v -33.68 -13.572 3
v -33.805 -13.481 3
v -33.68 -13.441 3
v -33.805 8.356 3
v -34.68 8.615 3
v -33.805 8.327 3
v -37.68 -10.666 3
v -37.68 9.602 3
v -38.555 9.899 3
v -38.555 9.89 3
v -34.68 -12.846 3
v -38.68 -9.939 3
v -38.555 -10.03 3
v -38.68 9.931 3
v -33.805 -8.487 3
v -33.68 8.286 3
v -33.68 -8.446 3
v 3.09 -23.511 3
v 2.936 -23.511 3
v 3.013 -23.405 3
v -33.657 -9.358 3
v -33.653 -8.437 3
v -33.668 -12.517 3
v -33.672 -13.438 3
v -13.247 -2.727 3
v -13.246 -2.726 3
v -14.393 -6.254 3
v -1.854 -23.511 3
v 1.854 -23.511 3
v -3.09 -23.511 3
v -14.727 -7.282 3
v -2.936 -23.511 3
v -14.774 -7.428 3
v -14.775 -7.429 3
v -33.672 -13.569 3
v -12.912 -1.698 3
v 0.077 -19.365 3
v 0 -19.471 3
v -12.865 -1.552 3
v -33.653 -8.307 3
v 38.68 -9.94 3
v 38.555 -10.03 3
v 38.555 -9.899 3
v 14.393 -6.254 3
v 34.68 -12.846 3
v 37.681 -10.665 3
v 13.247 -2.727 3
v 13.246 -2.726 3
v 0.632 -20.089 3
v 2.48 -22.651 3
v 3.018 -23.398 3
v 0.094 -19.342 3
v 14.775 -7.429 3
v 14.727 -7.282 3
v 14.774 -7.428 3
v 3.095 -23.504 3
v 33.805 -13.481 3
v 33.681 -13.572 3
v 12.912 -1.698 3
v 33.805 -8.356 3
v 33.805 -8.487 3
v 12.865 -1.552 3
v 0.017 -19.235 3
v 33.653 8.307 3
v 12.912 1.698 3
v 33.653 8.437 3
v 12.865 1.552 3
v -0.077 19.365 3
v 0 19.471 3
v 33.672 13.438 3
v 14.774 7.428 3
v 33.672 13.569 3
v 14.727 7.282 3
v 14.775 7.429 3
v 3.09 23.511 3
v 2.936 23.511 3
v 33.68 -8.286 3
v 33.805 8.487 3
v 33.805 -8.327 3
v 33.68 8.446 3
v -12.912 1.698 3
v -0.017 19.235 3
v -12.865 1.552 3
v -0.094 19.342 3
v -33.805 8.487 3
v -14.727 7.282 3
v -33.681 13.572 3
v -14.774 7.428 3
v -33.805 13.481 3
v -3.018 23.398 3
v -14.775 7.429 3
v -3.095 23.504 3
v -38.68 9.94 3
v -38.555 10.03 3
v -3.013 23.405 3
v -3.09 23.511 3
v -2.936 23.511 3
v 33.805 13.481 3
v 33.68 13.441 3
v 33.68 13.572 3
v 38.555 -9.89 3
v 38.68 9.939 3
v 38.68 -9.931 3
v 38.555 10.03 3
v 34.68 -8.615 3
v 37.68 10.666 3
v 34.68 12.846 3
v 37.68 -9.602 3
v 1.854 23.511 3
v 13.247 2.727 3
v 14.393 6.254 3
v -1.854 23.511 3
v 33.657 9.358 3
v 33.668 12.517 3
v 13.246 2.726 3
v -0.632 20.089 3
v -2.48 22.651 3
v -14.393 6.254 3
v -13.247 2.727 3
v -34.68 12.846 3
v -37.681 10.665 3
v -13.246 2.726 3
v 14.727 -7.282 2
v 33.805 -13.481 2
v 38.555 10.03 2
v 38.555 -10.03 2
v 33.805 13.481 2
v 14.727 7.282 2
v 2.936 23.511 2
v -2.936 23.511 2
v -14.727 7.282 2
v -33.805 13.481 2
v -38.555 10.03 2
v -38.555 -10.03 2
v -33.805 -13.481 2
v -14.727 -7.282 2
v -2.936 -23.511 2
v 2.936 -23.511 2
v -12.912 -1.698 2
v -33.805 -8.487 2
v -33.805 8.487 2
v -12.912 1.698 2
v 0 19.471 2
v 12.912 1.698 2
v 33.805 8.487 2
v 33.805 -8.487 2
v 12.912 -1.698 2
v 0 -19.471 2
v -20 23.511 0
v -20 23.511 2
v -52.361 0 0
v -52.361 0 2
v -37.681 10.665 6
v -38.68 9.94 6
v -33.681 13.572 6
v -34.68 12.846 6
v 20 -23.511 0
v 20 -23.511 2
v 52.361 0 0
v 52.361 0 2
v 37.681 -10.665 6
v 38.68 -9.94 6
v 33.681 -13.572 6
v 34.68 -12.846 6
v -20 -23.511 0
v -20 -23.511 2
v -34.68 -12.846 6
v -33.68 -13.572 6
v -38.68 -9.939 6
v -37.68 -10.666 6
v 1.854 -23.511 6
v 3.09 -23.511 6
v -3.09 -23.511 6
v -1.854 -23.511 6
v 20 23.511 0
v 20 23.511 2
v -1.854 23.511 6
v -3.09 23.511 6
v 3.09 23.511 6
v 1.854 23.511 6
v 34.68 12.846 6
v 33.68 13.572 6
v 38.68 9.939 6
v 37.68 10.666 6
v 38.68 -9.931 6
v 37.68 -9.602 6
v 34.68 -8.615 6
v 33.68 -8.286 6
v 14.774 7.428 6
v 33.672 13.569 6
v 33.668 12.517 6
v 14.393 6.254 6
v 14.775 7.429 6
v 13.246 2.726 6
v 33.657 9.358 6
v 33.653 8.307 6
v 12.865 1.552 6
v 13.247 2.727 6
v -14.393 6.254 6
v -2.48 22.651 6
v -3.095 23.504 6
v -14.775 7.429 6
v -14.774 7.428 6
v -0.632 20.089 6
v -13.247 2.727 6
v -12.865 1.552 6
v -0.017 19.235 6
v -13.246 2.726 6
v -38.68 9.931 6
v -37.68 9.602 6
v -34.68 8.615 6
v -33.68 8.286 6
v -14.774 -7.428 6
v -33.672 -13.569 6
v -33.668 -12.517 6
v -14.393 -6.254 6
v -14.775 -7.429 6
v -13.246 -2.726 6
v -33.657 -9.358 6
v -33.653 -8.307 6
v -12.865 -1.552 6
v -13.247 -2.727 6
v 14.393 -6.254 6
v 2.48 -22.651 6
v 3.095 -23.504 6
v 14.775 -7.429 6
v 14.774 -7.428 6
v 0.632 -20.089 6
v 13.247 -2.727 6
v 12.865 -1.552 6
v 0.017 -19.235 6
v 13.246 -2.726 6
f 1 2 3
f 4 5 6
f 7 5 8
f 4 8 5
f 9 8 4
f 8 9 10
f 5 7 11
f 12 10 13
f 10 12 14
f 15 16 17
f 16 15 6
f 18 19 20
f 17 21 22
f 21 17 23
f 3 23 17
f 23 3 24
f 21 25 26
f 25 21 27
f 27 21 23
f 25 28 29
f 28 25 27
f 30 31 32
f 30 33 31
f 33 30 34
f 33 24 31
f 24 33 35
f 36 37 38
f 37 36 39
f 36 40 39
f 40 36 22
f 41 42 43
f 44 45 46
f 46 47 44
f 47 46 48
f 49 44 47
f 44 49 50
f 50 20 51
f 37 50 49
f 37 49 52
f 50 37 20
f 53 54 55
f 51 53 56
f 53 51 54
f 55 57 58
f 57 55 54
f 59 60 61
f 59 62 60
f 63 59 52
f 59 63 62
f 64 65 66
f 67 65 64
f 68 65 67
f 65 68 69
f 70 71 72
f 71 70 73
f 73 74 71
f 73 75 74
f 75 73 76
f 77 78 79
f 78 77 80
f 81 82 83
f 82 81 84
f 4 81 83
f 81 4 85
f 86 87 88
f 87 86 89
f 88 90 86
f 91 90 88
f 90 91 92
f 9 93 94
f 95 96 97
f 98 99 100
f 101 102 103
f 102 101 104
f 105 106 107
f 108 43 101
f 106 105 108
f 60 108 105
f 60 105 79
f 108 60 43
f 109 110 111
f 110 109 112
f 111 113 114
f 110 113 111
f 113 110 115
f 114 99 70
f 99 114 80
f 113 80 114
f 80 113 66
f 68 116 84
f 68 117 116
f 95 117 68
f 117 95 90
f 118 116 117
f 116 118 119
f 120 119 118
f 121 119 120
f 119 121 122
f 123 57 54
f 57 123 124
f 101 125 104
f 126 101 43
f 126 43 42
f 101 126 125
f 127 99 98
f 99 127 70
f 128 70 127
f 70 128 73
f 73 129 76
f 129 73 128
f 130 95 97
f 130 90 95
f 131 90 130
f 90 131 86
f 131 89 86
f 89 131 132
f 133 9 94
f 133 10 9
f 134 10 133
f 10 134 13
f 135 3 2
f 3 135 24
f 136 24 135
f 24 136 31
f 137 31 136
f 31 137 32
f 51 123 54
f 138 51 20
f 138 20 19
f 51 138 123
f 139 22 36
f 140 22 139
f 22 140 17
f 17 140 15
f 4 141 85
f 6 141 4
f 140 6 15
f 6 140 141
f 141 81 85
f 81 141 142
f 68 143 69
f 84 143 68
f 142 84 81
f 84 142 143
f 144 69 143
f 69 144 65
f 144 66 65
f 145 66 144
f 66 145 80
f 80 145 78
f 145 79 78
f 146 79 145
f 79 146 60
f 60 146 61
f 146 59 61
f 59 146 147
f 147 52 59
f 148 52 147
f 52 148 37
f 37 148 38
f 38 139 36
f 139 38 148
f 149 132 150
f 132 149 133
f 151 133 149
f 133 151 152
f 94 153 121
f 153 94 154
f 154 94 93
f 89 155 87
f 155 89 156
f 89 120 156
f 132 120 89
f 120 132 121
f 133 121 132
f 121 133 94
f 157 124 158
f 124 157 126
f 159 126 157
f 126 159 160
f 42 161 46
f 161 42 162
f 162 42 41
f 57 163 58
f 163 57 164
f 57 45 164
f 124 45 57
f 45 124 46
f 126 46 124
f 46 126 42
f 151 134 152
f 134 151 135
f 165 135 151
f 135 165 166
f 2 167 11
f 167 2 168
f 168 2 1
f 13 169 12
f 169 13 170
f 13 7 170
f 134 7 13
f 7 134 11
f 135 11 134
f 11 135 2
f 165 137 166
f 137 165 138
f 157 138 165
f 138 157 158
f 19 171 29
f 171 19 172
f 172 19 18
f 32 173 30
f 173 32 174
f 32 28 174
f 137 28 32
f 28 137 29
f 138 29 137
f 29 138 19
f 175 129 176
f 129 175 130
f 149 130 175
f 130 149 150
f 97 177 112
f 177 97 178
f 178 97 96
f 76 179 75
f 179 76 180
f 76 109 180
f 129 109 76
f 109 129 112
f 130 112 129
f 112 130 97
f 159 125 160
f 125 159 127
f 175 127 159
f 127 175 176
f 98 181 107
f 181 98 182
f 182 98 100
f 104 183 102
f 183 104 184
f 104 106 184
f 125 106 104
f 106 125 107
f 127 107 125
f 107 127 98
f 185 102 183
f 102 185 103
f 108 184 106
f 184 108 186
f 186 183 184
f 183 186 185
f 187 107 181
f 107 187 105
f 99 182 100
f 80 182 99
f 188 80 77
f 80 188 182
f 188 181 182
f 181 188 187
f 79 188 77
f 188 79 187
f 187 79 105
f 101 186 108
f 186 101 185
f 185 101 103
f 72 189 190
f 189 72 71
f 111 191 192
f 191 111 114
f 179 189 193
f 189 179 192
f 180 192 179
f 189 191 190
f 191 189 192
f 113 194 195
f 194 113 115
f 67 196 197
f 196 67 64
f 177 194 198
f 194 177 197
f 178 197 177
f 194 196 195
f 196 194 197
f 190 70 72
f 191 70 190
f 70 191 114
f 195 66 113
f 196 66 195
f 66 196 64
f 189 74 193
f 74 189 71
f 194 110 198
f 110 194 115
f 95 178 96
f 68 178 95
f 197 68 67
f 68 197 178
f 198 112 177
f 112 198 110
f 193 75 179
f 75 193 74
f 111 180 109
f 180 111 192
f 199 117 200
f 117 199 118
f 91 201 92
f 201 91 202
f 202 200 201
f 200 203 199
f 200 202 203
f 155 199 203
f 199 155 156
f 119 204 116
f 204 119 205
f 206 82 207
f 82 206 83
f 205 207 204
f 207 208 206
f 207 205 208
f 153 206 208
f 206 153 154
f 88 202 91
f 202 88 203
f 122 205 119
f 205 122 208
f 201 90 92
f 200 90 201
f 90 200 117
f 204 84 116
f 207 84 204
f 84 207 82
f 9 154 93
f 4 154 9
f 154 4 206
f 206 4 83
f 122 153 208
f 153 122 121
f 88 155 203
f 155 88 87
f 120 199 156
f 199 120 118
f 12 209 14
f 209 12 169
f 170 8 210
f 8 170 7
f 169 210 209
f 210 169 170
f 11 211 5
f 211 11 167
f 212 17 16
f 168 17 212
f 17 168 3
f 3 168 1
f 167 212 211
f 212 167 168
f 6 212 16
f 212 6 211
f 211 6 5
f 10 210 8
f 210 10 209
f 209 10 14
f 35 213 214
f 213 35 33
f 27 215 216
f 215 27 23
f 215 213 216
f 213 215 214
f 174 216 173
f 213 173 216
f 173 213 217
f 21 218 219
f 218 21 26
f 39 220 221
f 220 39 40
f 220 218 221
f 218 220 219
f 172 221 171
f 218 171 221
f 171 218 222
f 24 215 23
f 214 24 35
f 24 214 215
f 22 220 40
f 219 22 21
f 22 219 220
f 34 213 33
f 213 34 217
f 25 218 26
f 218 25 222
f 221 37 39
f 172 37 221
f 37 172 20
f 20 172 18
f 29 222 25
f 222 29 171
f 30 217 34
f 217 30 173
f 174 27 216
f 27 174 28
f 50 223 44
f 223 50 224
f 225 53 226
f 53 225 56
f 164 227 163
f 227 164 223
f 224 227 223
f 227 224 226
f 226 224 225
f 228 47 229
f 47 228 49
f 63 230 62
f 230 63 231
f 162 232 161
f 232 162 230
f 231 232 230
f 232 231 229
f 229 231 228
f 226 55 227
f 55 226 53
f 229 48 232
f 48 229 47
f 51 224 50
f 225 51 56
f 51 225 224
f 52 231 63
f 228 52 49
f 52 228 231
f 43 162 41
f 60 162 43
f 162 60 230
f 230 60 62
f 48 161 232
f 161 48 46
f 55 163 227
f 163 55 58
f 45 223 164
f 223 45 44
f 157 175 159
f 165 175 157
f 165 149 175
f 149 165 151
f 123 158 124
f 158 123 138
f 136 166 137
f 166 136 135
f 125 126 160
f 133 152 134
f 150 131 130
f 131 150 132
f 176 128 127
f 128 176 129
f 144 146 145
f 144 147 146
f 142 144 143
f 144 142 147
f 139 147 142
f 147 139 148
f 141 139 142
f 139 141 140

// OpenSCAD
// mathgrrl and larum 3D Girih tiles

/////////////////////////////////////////////////////////////////////
// facts

// https://en.wikipedia.org/wiki/Girih
// https://en.wikipedia.org/wiki/Girih_tiles
// five tiles: decagon, elongated hexagon, bow tie, rhombus, pentagon
// all sides the same length
// all angles multiples of 36 degrees (pi/5)
// each has unique strapwork pattern
// except decagon has two possible strapwork patterns
// strapwork always meets edges at 54 degrees (3pi/10)

// SXSW SIZES
// 40,2,2,3,1.5,5,1,2,.5,1

////////////////////////////////////////////////////////
// user-defined parameters

/* [Type] */

// Choose a tile shape
shape = "HEX"; //[PEN:Pentagon,DEC:Decagon,BOW:Bowtie,RHO:Rhombus,HEX:Irregular Hexagon,SPECIAL:Cross-Tile Mosaic Pieces]
// Choose tile, strapwork, or mosaic
kind = "FULLSTRIPES"; //[TILE:Plain Tile,ETCH:Etched Tile,LINES:Strapwork,STRIPES:Fancy Strapwork,FULLPLAIN:Tile with Strapwork,FULLSTRIPES:Tile with Fancy Strapwork,MOSAIC:Mosaic Piece(s)

/* [Size] */

// Length of tile side
sideLength = 40; 

// Height of tile base
tileHeight = 2;

// Height of plain strapwork
strapHeight = 2;

// Additional height for fancy strapwork
ridgeHeight = 3;

// Thickness of mosaic pieces
mosaicHeight = 1.5;

/* [Style] */

// Thickness of plain strapwork
strapThick = 5; 

// Thickenss of fancy strapwork stripes
ridgeThick = 1;

// Amount of strapwork fanciness
ridgeNumber = 2; //[2,3]

/* [Tolerance] */

// Clearance between etching, strapwork, and mosaic pieces
clearance = .5; 

// Depth of tile etching
embed = 1; 

////////////////////////////////////////////////////////
// invisible parameters

s = sideLength*1; // shorter name :)

cover = 6*1; // for cuts to go far enough out

ridgeGap = (strapThick-3*ridgeThick)/2; 

m = s - strapThick; // magic number for scaling

//preview[view:south, tilt:top]

////////////////////////////////////////////////////////
// renders

makeThing();

////////////////////////////////////////////////////////
// module for picking the render

module makeThing(){
    
    // PENTAGON PIECES
    if (shape=="PEN" && kind=="TILE") PENtile();
    if (shape=="PEN" && kind=="ETCH") PENetch();
    if (shape=="PEN" && kind=="LINES") PENlines();
    if (shape=="PEN" && kind=="STRIPES") PENstripes();
    if (shape=="PEN" && kind=="FULLPLAIN") PENfullplain();
    if (shape=="PEN" && kind=="FULLSTRIPES") PENfullstripes();
    if (shape=="PEN" && kind=="MOSAIC") mosaicPEN();
        
    // DECAGON PIECES
    if (shape=="DEC" && kind=="TILE") DECtile();
    if (shape=="DEC" && kind=="ETCH") DECetch();
    if (shape=="DEC" && kind=="LINES") DEClines();
    if (shape=="DEC" && kind=="STRIPES") DECstripes();
    if (shape=="DEC" && kind=="FULLPLAIN") DECfullplain();
    if (shape=="DEC" && kind=="FULLSTRIPES") DECfullstripes();
    if (shape=="DEC" && kind=="MOSAIC") {mosaicDEC(); mosaicDEC2();}
        
    // BOWTIE PIECES
    if (shape=="BOW" && kind=="TILE") BOWtile();
    if (shape=="BOW" && kind=="ETCH") BOWetch();
    if (shape=="BOW" && kind=="LINES") BOWlines();
    if (shape=="BOW" && kind=="STRIPES") BOWstripes();
    if (shape=="BOW" && kind=="FULLPLAIN") BOWfullplain();
    if (shape=="BOW" && kind=="FULLSTRIPES") BOWfullstripes();
    if (shape=="BOW" && kind=="MOSAIC") mosaicBOW();
        
    // RHOMBUS PIECES
    if (shape=="RHO" && kind=="TILE") RHOtile();
    if (shape=="RHO" && kind=="ETCH") RHOetch();
    if (shape=="RHO" && kind=="LINES") RHOlines();
    if (shape=="RHO" && kind=="STRIPES") RHOstripes();
    if (shape=="RHO" && kind=="FULLPLAIN") RHOfullplain();
    if (shape=="RHO" && kind=="FULLSTRIPES") RHOfullstripes();
    if (shape=="RHO" && kind=="MOSAIC") mosaicRHO();
        
    // HEXAGON PIECES
    if (shape=="HEX" && kind=="TILE") HEXtile();
    if (shape=="HEX" && kind=="ETCH") HEXetch();
    if (shape=="HEX" && kind=="LINES") HEXlines();
    if (shape=="HEX" && kind=="STRIPES") HEXstripes();
    if (shape=="HEX" && kind=="FULLPLAIN") HEXfullplain();
    if (shape=="HEX" && kind=="FULLSTRIPES") HEXfullstripes();
    if (shape=="HEX" && kind=="MOSAIC") mosaicHEX();
        
    // CROSS-TILE MOSAIC PIECES
    if (shape=="SPECIAL"){
        translate([1.4*s,-.45*s,0]) mosaicYYVV();
        translate([1.2*s,.5*s,0]) mosaicYVYV();
        translate([.35*s,.9*s,0]) mosaicYYYYY();
        translate([.2*s,0,0]) mosaicYYXYY();
    }
}

////////////////////////////////////////////////////////
// modules for multi-tile mosaic pieces

// YYVV mosaic piece
// in other words, PEN PEN RHO RHO
module mosaicYYVV(){
    clear = .25*clearance;
    color("gray")
    intersection(){
        // assemble the shape
        union(){
            color("orange")
                translate([-.01,0,0])
                difference(){
                    PENcomplement(clear);
                    mosaicPEN(clear);
                }
            color("green")
                translate(2*PENmids[2])
                rotate(180)
                difference(){
                    PENcomplement(clear);
                    mosaicPEN(clear);
                }
            color("red")
                translate([-8.6*s/40,46.1*s/40,0])
                rotate(36+18)
                difference(){
                    RHOcomplement(clear);
                    mosaicRHO(clear);
                }
            color("violet")
                translate([(-8.5-38)*s/40,46.1*s/40,0])
                mirror([0,1])
                rotate(36+18)
                difference(){
                    RHOcomplement(clear);
                    mosaicRHO(clear);
                }
        }
        // intersect to get just the interior part
        translate([-27*s/40,20*s/40,0])
                cylinder(r=.45*m*40/35);  
    }
}
// YVYV mosaic piece
// in other words, PEN RHO PEN RHO
module mosaicYVYV(){
    clear = .25*clearance;
    color("gray")
    intersection(){
        // assemble the shape
        union(){
            color("orange")
                difference(){
                    PENcomplement(clear);
                    mosaicPEN(clear);
                }
            color("green")
                translate(2*PENmids[2])
                translate([0,s,0])
                rotate(180)
                difference(){
                    PENcomplement(clear);
                    mosaicPEN(clear);
                }
            color("red")
                translate([-8.6*s/40,46.1*s/40,0])
                rotate(36+18)
                difference(){
                    RHOcomplement(clear);
                    mosaicRHO(clear);
                }
            color("violet")
                translate([(-8.5-38)*s/40,33.84*s/40,0])
                translate([0,-s,0])
                mirror([0,1])
                rotate(-36-18)
                difference(){
                    RHOcomplement(clear);
                    mosaicRHO(clear);
                }
        }
        // intersect to get just the interior part
        translate([-27*s/40,20*s/40,0])
                cylinder(r=.45*m*40/35);  
    }
}

// YYYYY mosaic piece
// in other words, RHO RHO RHO RHO RHO
module mosaicYYYYY(){
    clear = .25*clearance;
    color("gray")
    intersection(){
        // assemble the shape
        color("violet")
        union(){
            for (i=[0:5]){
                translate([-s*sin(54),0,0])
                rotate(72*i)
                translate([s*sin(54),0,0])
                difference(){
                    RHOcomplement(clear);
                    mosaicRHO(clear);
                }
            }
        }
        // intersect to get just the interior part
        translate([-32.5*s/40,0,0])
                cylinder(r=.45*m*40/35);  
    }
}

// YYXYY mosaic piece
// in other words, RHO RHO on both ends with BOW middle
module mosaicYYXYY(){
    clear = .25*clearance;
    color("gray")
    mosaicYYYYY();
    translate([-49.5*(s/40),0,0]) // total hack
    //translate([1.4*(BOWmids[2][0]+(5-strapThick*40/s)),0,0]) 
        rotate(180) mosaicYYYYY();
}

////////////////////////////////////////////////////////
// modules for interior mosaic pieces
// customizable but may not work with wide-variety customization

// inside of pentagon piece
module mosaicPEN(clear=.75*clearance){
    color("gray")
    difference(){
        PENcomplement(clear);
        // take out the extra
        translate([0,0,-1]) 
        linear_extrude(mosaicHeight+2) 
            union(){
                for (i=[0:4]){
                    rotate(72*i,[0,0,1])
                        translate([-.82*m,.59*m,0]) 
                            rotate(9,[0,0,1]) 
                                circle(r=s/2,$fn=8);
                }
        }
    }
}

// large inside of decagon piece
module mosaicDEC(clear=.75*clearance){
    color("gray")
    difference(){
        DECcomplement(clear);
        // take out the extra
        translate([0,0,-1]) 
        linear_extrude(mosaicHeight+2) 
            union(){
                for (i=[0:9]){
                    rotate(36*i,[0,0,1])
                        rotate(-2,[0,0,1])
                        translate([-1.4*m,1.7*m,0]) 
                            rotate(-12,[0,0,1]) 
                                circle(r=s,$fn=10);
                }
        }
    }
}


// small inside of decagon piece
module mosaicDEC2(clear=.75*clearance){
    color("gray")
    difference(){
        DECcomplement(clear);
        // take out the extra
        mosaicDEC(clear);
        translate([0,0,-1]) 
        linear_extrude(mosaicHeight+2) 
            union(){
                for (i=[0:9]){
                    rotate(36*i,[0,0,1])
                        translate([-1.25*m,1.6*m,0]) 
                            rotate(-26,[0,0,1]) 
                                square(m);
                }
        }
    }
}

module mosaicBOW(clear=.75*clearance){
    color("gray")
    difference(){
        BOWcomplement(clear);
        // take out the extra
        translate([0,0,-1]) 
        linear_extrude(mosaicHeight+2) 
            union(){
                translate([-.5*(.69*m+2*strapThick),-.5*(.69*m+2*strapThick)]) 
                    square(.69*m+2*strapThick);
                translate([-1.15*m,-.1*m])
                    rotate(36) 
                        square(.86*s);
                mirror([0,1])
                    translate([-1.15*m,-.1*m])
                        rotate(36) 
                            square(.86*s);
                mirror([1,0])
                    translate([-1.15*m,-.1*m])
                        rotate(36) 
                            square(.86*s);
                mirror([1,0]) mirror([0,1])
                    translate([-1.15*m,-.1*m])
                        rotate(36) 
                            square(.86*s);
            }
    }
}

// inside of rhombus piece
module mosaicRHO(clear=.75*clearance){
    color("gray")
    difference(){
        RHOcomplement(clear);
        // take out the extra
        translate([0,0,-1]) 
        linear_extrude(mosaicHeight+2) 
            union(){
                translate([0,.7*m]) 
                    rotate(-10) circle(r=s/2,$fn=9);
                mirror([0,1])
                    translate([0,.7*m]) 
                        rotate(-10) circle(r=s/2,$fn=9);
                translate([-.81*m,0])
                    square(.7*s,center=true);
                translate([.81*m,0])
                    square(.7*s,center=true);
            }
        
    }
}

// inside of hexagon piece
module mosaicHEX(clear=.75*clearance){
    color("gray")
    difference(){
        HEXcomplement(clear);
        // take out the extra
        translate([0,0,-1]) 
        linear_extrude(mosaicHeight+2) 
            union(){
                translate([-.55*m,.61*m,0]) 
                    circle(r=s/2,$fn=5);
                mirror([0,1]) 
                    translate([-.55*m,.61*m,0]) 
                        circle(r=s/2,$fn=5);
                mirror([1,0]) 
                    translate([-.55*m,.61*m,0]) 
                        circle(r=s/2,$fn=5);
                mirror([0,1]) 
                    mirror([1,0]) 
                        translate([-.55*m,.61*m,0]) 
                            circle(r=s/2,$fn=5);
                translate([1.42*m,.0,0]) 
                    circle(r=s/2,$fn=5);
                mirror([1,0])
                    translate([1.42*m,.0,0]) 
                        circle(r=s/2,$fn=5);
        }
    }
}

////////////////////////////////////////////////////////
// general modules

module strapCut(A,B,h){
    hull(){
        translate(go(A,B,-cover)) 
            translate(h*normal(A,B))
                cylinder(r=ridgeThick/2,h=ridgeHeight,$fn=48);
        translate(go(B,A,-cover)) 
            translate(h*normal(A,B))
                cylinder(r=ridgeThick/2,h=ridgeHeight,$fn=48);
    }
}

////////////////////////////////////////////////////////
// definitions and modules for PEN tiles
// regular pentagon

// calculate pentagon radius given side length
PENradius = (sin(54)/sin(72))*s; 

// list of pentagon vertex points
PENpoints = [for (i=[0:4]) PENradius*[cos(i*360/5),sin(i*360/5)]];
    
// extruded plain pentagon tile
module PENtile(){
    color("violet")
    linear_extrude(height=tileHeight)
    polygon(points=PENpoints, paths=[[for (i=[0:4]) i]]);
}

// list of pentagon midpoints
PENmids = [for (i=[0:4]) move(PENpoints[i%5],PENpoints[(i+1)%5],.5)];
    
// inside points for the pentagon strapwork
// used trig to calculate that these points are halfway in
PENinside = [for (i=[0:4]) (PENradius/2)*[cos(i*360/5),sin(i*360/5)]];

// path of the pentagon strapwork
// alternates between vertex points and interior points
PENpath = [for (i=[0:9]) 
    i%2==0 ?
        // outside points of star for even i
        move(PENpoints[(i/2)%5],PENpoints[(i/2+1)%5],.5) :
        // inside points of star for odd i
        PENinside[((i+1)/2)%5]
];

// 2D polygon whose boundary is the pentagon strapwork line
module PENshape(){
    polygon(points=PENpath, paths=[[for (i=[0:9]) i]]);
}
    
// extruded and thickened pentagon strapwork line 
module PENstrap(strap=strapThick){
    // default is strapThick
    // but can specify others for clearance
    intersection(){
        linear_extrude(strapHeight)
            difference(){
                offset(delta=strap/2) PENshape();
                offset(delta=-strap/2) PENshape();
            }
        scale([1,1,strapHeight/tileHeight]) 
            PENtile();
    }
}

// pentagon tile with enlarged strapwork etching
module PENetch(){
    color("violet")
    difference(){
        PENtile();
        translate([0,0,tileHeight-embed])
            PENstrap(strapThick+clearance);
    }
}

// pentagon strapwork alone
module PENlines(){
    color("white") 
    PENstrap(strapThick-.5*clearance);
}

// one piece of the pentagon stripes
module PENchunk(){
    // first pair, with end cut
    intersection(){
        union(){
            strapCut(PENmids[0],PENinside[1],ridgeGap+ridgeThick);
            if (ridgeNumber==3) 
                strapCut(PENmids[0],PENinside[1],0);
            strapCut(PENmids[0],PENinside[1],-1*(ridgeGap+ridgeThick));
        }
        linear_extrude(strapHeight+ridgeHeight+1)
        polygon(points=[
                    go(PENmids[0],[0,0],4.3*strapThick/5),
                    go(PENmids[0],PENpoints[1],3.1*strapThick/5),
                    PENpoints[1],
                    [0,0]],
                paths=[[0,1,2,3]]);
    }
    // second pair, no cut
    intersection(){
        union(){
            strapCut(PENinside[1],PENmids[1],ridgeGap+ridgeThick);
            if (ridgeNumber==3) 
                strapCut(PENinside[1],PENmids[1],0);
            strapCut(PENinside[1],PENmids[1],-1*(ridgeGap+ridgeThick));
        }
        linear_extrude(strapHeight+ridgeHeight+1)
        polygon(points=[
                    PENpoints[1],
                    PENpoints[2],
                    [0,0]],
                paths=[[0,1,2]]);
    }
}

// all of the pentagon stripes
module PENstripes(){
    color("white")
    union(){
        PENlines();
        translate([0,0,strapHeight])
            for (i=[0:4]) 
                rotate(i*360/5,[0,0,1]) PENchunk();
    }
}

// pentagon tile with plain strapwork attached
module PENfullplain(){
    union(){
        color("violet") PENtile();
        translate([0,0,tileHeight-embed])
            color("white") PENlines();
    }
}

// pentagon tile with striped strapwork attached
module PENfullstripes(){
    union(){
        color("violet") PENtile();
        translate([0,0,tileHeight-embed])
            color("white") PENstripes();
    }
}

// pentagon tile with lines + offset clearance removed
module PENcomplement(clear=.75*clearance){
    difference(){
        // pentagon tile
        linear_extrude(mosaicHeight)
            projection([0,0,1])
                PENtile();
        // remove lines with clearance
        translate([0,0,-1]) 
            linear_extrude(mosaicHeight+2) 
            offset(delta=clear) 
            projection([0,0,1]) 
                PENlines();
    }
}

////////////////////////////////////////////////////////
// definitions and modules for DEC tiles
// regular decagon

// calculate decagon radius given side length
DECradius = (sin(72)/sin(36))*s;

// list of decagon vertex points
DECpoints = [for (i=[0:9]) DECradius*[cos(i*360/10),sin(i*360/10)]];
    
// extruded plain decagon tile
module DECtile(){
    color("lightgreen")
    linear_extrude(height=tileHeight)
    polygon(points=DECpoints, paths=[[for (i=[0:9]) i]]);
}

// list of decagon midpoints
DECmids = [for (i=[0:9]) move(DECpoints[i%10],DECpoints[(i+1)%10],.5)];

// inside points for the decagon strapwork
// CHECK LATER this might break slightly upon scaling
DECinside = 
    [for (i=[0:9]) 
        go( DECmids[i%10],
            DECmids[i%10]-normal(DECpoints[i%10],DECpoints[(i+1)%10]),
            23.49*s/40)];

// path of the decagon strapwork
// alternates between vertex points and interior points
DECpathA = [for (i=[0:9]) 
    i%2==0 ?
        // outside points of star for even i
        DECmids[i] :
        // inside points of star for odd i
        DECinside[i]
];

// 2D polygon whose boundary is the decagon strapwork line
module DECshape(){
    polygon(points=DECpathA, paths=[[for (i=[0:9]) i]]);
}
    
// extruded and thickened decagon strapwork line 
module DECstrap(strap=strapThick){
    // default is strapThick
    // but can specify others for clearance
    intersection(){
        linear_extrude(height=strapHeight)
            difference(){
                offset(delta=strap/2) DECshape();
                offset(delta=-strap/2) DECshape();
            }
        scale([1,1,strapHeight/tileHeight]) 
            DECtile();
    }
}

// decagon tile with enlarged strapwork etching
module DECetch(){
    color("lightgreen")
    difference(){
        DECtile();
        translate([0,0,tileHeight-embed])
            DECstrap(strapThick+clearance);
        rotate(36,[0,0,1])
            translate([0,0,tileHeight-embed])
                DECstrap(strapThick+clearance);
    }
}

// decagon strapwork alone
module DEClines(){
    color("white")
    union(){
        DECstrap(strapThick-.5*clearance);
        rotate(36,[0,0,1])
            DECstrap(strapThick-.5*clearance);
    }
}

// first piece of the decagon stripes
// 0th mid with cut, overcrossing, end at 1st mid
module DECchunkA1(){
    intersection(){
        union(){
            strapCut(DECmids[0],DECinside[1],ridgeGap+ridgeThick);
            if (ridgeNumber==3) 
                strapCut(DECmids[0],DECinside[1],0);
            strapCut(DECmids[0],DECinside[1],-1*(ridgeGap+ridgeThick));
        }
        linear_extrude(strapHeight+ridgeHeight+1)
        polygon(points=[
                    go( DECmids[0],
                        DECmids[0]-normal(DECpoints[0],DECpoints[1]),
                        4.1*strapThick/5),
                    go(DECmids[0],DECpoints[1],3*strapThick/5),
                    DECmids[1],
                    [0,0]],
                paths=[[0,1,2,3]]);
    }
}

// second piece of the decagon stripes
// 1st mid, before undercrossing, pointed at 2nd mid
// CHECK LATER this may break on scaling
module DECchunkA2(){
    intersection(){
        union(){
            strapCut(DECinside[1],DECmids[2],ridgeGap+ridgeThick);
            if (ridgeNumber==3) 
                strapCut(DECinside[1],DECmids[2],0);
            strapCut(DECinside[1],DECmids[2],-1*(ridgeGap+ridgeThick));
        }
        linear_extrude(strapHeight+ridgeHeight+1)
        polygon(points=[
                    [0,0],
                    go( DECmids[1],
                        DECmids[1]-normal(DECpoints[1],DECpoints[2]),
                        4.1*strapThick/5),
                    go([0,0],DECmids[2],
                        35.57*DECradius/64.72 // why not 28.45? see below
                        -(.5*strapThick/DECradius)*(sin(72)/sin(36))*s+2.5)],
                paths=[[0,1,2,3]]);
    }
}

// third piece of the decagon stripes
// 1st mid, after undercrossing, ending at 2nd mid with no cut
module DECchunkA3(){
    intersection(){
        union(){
            strapCut(DECinside[1],DECmids[2],ridgeGap+ridgeThick);
            if (ridgeNumber==3) 
                strapCut(DECinside[1],DECmids[2],0);
            strapCut(DECinside[1],DECmids[2],-1*(ridgeGap+ridgeThick));
        }
        linear_extrude(strapHeight+ridgeHeight+1)
        polygon(points=[
                    go( [0,0],DECmids[2],
                        35.57*DECradius/64.72
                        +(.5*strapThick/DECradius)*(sin(72)/sin(36))*s+2.5),
                    go(DECmids[1],DECpoints[2],2.7*strapThick/5),
                    DECpoints[2],
                    DECpoints[3]],
                paths=[[0,1,2,3]]);
    }
}

// all of the decagon stripes
module DECstripes(){
    color("white")
    union(){
        DEClines();
        translate([0,0,strapHeight])
            for (i=[0:9]){
                rotate(36*i,[0,0,1]) DECchunkA1();
                rotate(36*i,[0,0,1]) DECchunkA2();
                rotate(36*i,[0,0,1]) DECchunkA3();
            }
    }
}
            
// decagon tile with strapwork attached
// 5-fold symmetry version
module DECfullplain(){
    union(){
        color("lightgreen") DECtile();
        translate([0,0,tileHeight-embed])
            color("white") DEClines();
        rotate(36,[0,0,1])
            translate([0,0,tileHeight-embed])
                color("white") DEClines();
    }
}

// decagon tile with striped strapwork attached
module DECfullstripes(){
    union(){
        color("lightgreen") DECtile();
        translate([0,0,tileHeight-embed])
            color("white") DECstripes();
    }
}

// decagon tile with lines + offset clearance removed
module DECcomplement(clear=.75*clearance){
    difference(){
        // pentagon tile
        linear_extrude(mosaicHeight)
            projection([0,0,1])
                DECtile();
        // remove lines with clearance
        translate([0,0,-1]) 
            linear_extrude(mosaicHeight+2) 
            offset(delta=clear) 
            projection([0,0,1]) 
                DEClines();
    }
}

////////////////////////////////////////////////////////
// definitions and modules for BOW tiles
// a certain irregular non-convex hexagon

// calculate bowtie radius given side length
// bowtie positioned vertically
// "radius" from center to right edge
BOWradius = s*sin(72); 

// list of bowtie vertex points
BOWpoints = [[BOWradius,s/2],[0,(s/2)-s*sin(18)],
             [-BOWradius,s/2],[-BOWradius,-s/2],
             [0,-((s/2)-s*sin(18))],[BOWradius,-s/2]];
    
// extruded plain bowtie tile
module BOWtile(){
    color("skyblue")
    linear_extrude(height=tileHeight)
    polygon(points=BOWpoints, paths=[[for (i=[0:5]) i]]);
}

// list of bowtie midpoints
BOWmids = [for (i=[0:5]) move(BOWpoints[i%6],BOWpoints[(i+1)%6],.5)];

// inside points for the bowtie strapwork
// used trig to calculate the interior point coordinates
BOWinside = [[BOWradius-(s/2)*sin(72)/sin(54),0],
             [-(BOWradius-(s/2)*sin(72)/sin(54)),0]];

// paths of the bowtie strapwork
// alternates between vertex points and interior points
BOWpath = [[BOWradius,0],
           BOWmids[0],
           BOWinside[0],
           BOWmids[4]
          ];

// 2D polygon whose boundary is the bowtie strapwork line
module BOWshape(){
    polygon(points=BOWpath, paths=[[0,1,2,3]]);
    mirror([1,0,0]) polygon(points=BOWpath, paths=[[0,1,2,3]]);
}
    
// extruded and thickened bowtie strapwork line 
module BOWstrap(strap=strapThick){
    // default is strapThick
    // but can specify others for clearance
    intersection(){
        linear_extrude(strapHeight)
            difference(){
                offset(delta=strap/2) BOWshape();
                offset(delta=-strap/2) BOWshape();
            }
        scale([1,1,strapHeight/tileHeight]) 
            BOWtile();
    }
}

// bowtie tile with enlarged strapwork etching
module BOWetch(){
    difference(){
    color("skyblue") BOWtile();
        translate([0,0,tileHeight-embed])
            color("white") BOWstrap(strapThick+clearance);
    }
}

// bowtie strapwork alone
module BOWlines(){
    color("white")
    BOWstrap(strapThick-.5*clearance);
}

// first piece of the bowtie stripes
// starting position to top right midpoint, with cut
module BOWchunk1(){
    intersection(){
        union(){
            strapCut(BOWmids[5],BOWmids[0],ridgeGap+ridgeThick);
            if (ridgeNumber==3) 
                strapCut(BOWmids[5],BOWmids[0],0);
            strapCut(BOWmids[5],BOWmids[0],-1*(ridgeGap+ridgeThick));
        }
        linear_extrude(strapHeight+ridgeHeight+1)
        polygon(points=[
                    go(BOWmids[5],[0,0],4.3*strapThick/5),
                    go(BOWmids[5],BOWpoints[0],3.1*strapThick/5),
                    BOWpoints[0],
                    BOWpoints[1]],
                paths=[[0,1,2,3]]);
    }
}

// second piece of the bowtie stripes
// top right midpoint to inside, with cut
module BOWchunk2(){
    intersection(){
        union(){
            strapCut(BOWmids[0],BOWinside[0],ridgeGap+ridgeThick);
            if (ridgeNumber==3) 
                strapCut(BOWmids[0],BOWinside[0],0);
            strapCut(BOWmids[0],BOWinside[0],-1*(ridgeGap+ridgeThick));
        }
        linear_extrude(strapHeight+ridgeHeight+1)
        polygon(points=[
                    go( BOWmids[0],
                        BOWmids[0]-normal(BOWpoints[0],BOWpoints[1]),
                        4.3*strapThick/5),
                    go(BOWmids[0],BOWpoints[1],3.1*strapThick/5),
                    [0,0],
                    BOWmids[5]],
                paths=[[0,1,2,3]]);
    }
}

// third piece of the bowtie stripes
// inside to bottom, no cut
module BOWchunk3(){
    intersection(){
        union(){
            strapCut(BOWinside[0],BOWmids[4],ridgeGap+ridgeThick);
            if (ridgeNumber==3) 
                strapCut(BOWinside[0],BOWmids[4],0);
            strapCut(BOWinside[0],BOWmids[4],-1*(ridgeGap+ridgeThick));
        }
        linear_extrude(strapHeight+ridgeHeight+1)
        polygon(points=[
                    BOWpoints[4],
                    BOWpoints[5],
                    BOWmids[5],
                    [0,0]],
                paths=[[0,1,2,3]]);
    }
}

// fourth piece of the bowtie stripes
// bottom to starting position, with cut
module BOWchunk4(){
    intersection(){
        union(){
            strapCut(BOWmids[4],BOWmids[5],ridgeGap+ridgeThick);
            if (ridgeNumber==3) 
                strapCut(BOWmids[4],BOWmids[5],0);
            strapCut(BOWmids[4],BOWmids[5],-1*(ridgeGap+ridgeThick));
        }
        linear_extrude(strapHeight+ridgeHeight+1)
        polygon(points=[
                    go( BOWmids[4],
                        BOWmids[4]-normal(BOWpoints[4],BOWpoints[5]),
                        4.3*strapThick/5),
                    go(BOWmids[4],BOWpoints[5],3.1*strapThick/5),
                    BOWpoints[5],
                    BOWpoints[0]],
                paths=[[0,1,2,3]]);
    }
}

// all of the bowtie stripes
module BOWstripes(){
    color("white")
    union(){
        BOWlines();
        union(){
            translate([0,0,strapHeight]) BOWchunk1();
            translate([0,0,strapHeight]) BOWchunk2();
            translate([0,0,strapHeight]) BOWchunk3();
            translate([0,0,strapHeight]) BOWchunk4();
        }
        rotate(180,[0,0,1])
        union(){
            translate([0,0,strapHeight]) BOWchunk1();
            translate([0,0,strapHeight]) BOWchunk2();
            translate([0,0,strapHeight]) BOWchunk3();
            translate([0,0,strapHeight]) BOWchunk4();
        }
    }
}

// bowtie tile with strapwork attached
module BOWfullplain(){
    color("skyblue") BOWtile();
    translate([0,0,tileHeight-embed])
        color("white") BOWstrap(strapThick-.5*clearance);
}

// bowtie tile with striped strapwork attached
module BOWfullstripes(){
    union(){
        color("skyblue") BOWtile();
        translate([0,0,tileHeight-embed])
            color("white") BOWstripes();
    }
}

// bowtie tile with lines + offset clearance removed
module BOWcomplement(clear=.75*clearance){
    difference(){
        // pentagon tile
        linear_extrude(mosaicHeight)
            projection([0,0,1])
                color("skyblue") BOWtile();
        // remove lines with clearance
        translate([0,0,-1]) 
            linear_extrude(mosaicHeight+2) 
            offset(delta=clear) 
            projection([0,0,1]) 
                color("white") BOWlines();
    }
}

////////////////////////////////////////////////////////
// definitions and modules for RHO tiles
// a certain rhombus

// calculate rhombus radius given side length
RHOradius = s*sin(54); 

// list of rhombus vertex points
RHOpoints = [[RHOradius,0],[0,s*sin(36)],
             [-RHOradius,0],[0,-s*sin(36)]];
    
// extruded plain rhombus tile
module RHOtile(){
    color("orange")
    linear_extrude(height=tileHeight)
    polygon(points=RHOpoints, paths=[[for (i=[0:5]) i]]);
}

// list of bowtie midpoints
RHOmids = [for (i=[0:3]) move(RHOpoints[i%4],RHOpoints[(i+1)%4],.5)];

// inside points for the rhombus strapwork
// used trig to calculate the interior point coordinates
RHOinside = [[0,s*sin(36)-(s/2)*sin(54)/sin(72)],
             [0,-(s*sin(36)-(s/2)*sin(54)/sin(72))]];

// paths of the rhombus strapwork
// alternates between vertex points and interior points
RHOpath = [RHOmids[0],
           RHOinside[0],
           RHOmids[1],
           RHOmids[2],
           RHOinside[1],
           RHOmids[3]
          ];

// 2D polygon whose boundary is the rhombus strapwork line
module RHOshape(){
    polygon(points=RHOpath, paths=[[for (i=[0:5]) i]]);
}
    
// extruded and thickened rhombus strapwork line 
module RHOstrap(strap=strapThick){
    // default is strapThick
    // but can specify others for clearance
    intersection(){
        linear_extrude(strapHeight)
            difference(){
                offset(delta=strap/2) RHOshape();
                offset(delta=-strap/2) RHOshape();
            }
        scale([1,1,strapHeight/tileHeight]) 
            RHOtile();
    }
}

// rhombus tile with enlarged strapwork etching
module RHOetch(){
    color("orange")
    difference(){
        RHOtile();
        translate([0,0,tileHeight-embed])
            RHOstrap(strapThick+clearance);
    }
}

// rhombus strapwork alone
module RHOlines(){
    color("white")
    RHOstrap(strapThick-.5*clearance);
}

// first piece of the rhombus stripes
// left vertical piece, with cut
module RHOchunk1(){
    intersection(){
        union(){
            strapCut(RHOmids[3],RHOmids[0],ridgeGap+ridgeThick);
            if (ridgeNumber==3) 
                strapCut(RHOmids[3],RHOmids[0],0);
            strapCut(RHOmids[3],RHOmids[0],-1*(ridgeGap+ridgeThick));
        }
        linear_extrude(strapHeight+ridgeHeight+1)
        polygon(points=[
                    [0,0],
                    go( RHOmids[3],
                        RHOmids[3]-normal(RHOpoints[3],RHOpoints[0]),
                        4.3*strapThick/5),
                    go(RHOmids[3],RHOpoints[0],3.1*strapThick/5),
                    RHOpoints[0],
                    RHOpoints[1]],
                paths=[[0,1,2,3,4]]);
    }
}

// second piece of the rhombus stripes
// top left to top inside, with cut
module RHOchunk2(){
    intersection(){
        union(){
            strapCut(RHOmids[0],RHOinside[0],ridgeGap+ridgeThick);
            if (ridgeNumber==3) 
                strapCut(RHOmids[0],RHOinside[0],0);
            strapCut(RHOmids[0],RHOinside[0],-1*(ridgeGap+ridgeThick));
        }
        linear_extrude(strapHeight+ridgeHeight+1)
        polygon(points=[
                    [0,0],
                    go( RHOmids[0],
                        RHOmids[0]-normal(RHOpoints[0],RHOpoints[1]),
                        4.3*strapThick/5),
                    go(RHOmids[0],RHOpoints[1],3.1*strapThick/5),
                    RHOpoints[0],
                    RHOpoints[1]],
                paths=[[0,1,2,3,4]]);
    }
}

// third piece of the rhombus stripes
// top inside to top right, no cut
module RHOchunk3(){
    intersection(){
        union(){
            strapCut(RHOmids[1],RHOinside[0],ridgeGap+ridgeThick);
            if (ridgeNumber==3) 
                strapCut(RHOmids[1],RHOinside[0],0);
            strapCut(RHOmids[1],RHOinside[0],-1*(ridgeGap+ridgeThick));
        }
        linear_extrude(strapHeight+ridgeHeight+1)
        polygon(points=[
                    [0,0],
                    RHOpoints[1],
                    RHOpoints[2]],
                paths=[[0,1,2,3,4]]);
    }
}

// all of the rhombus stripes
module RHOstripes(){
    color("white")
    union(){
        RHOlines();
        union(){
            translate([0,0,strapHeight]) RHOchunk1();
            translate([0,0,strapHeight]) RHOchunk2();
            translate([0,0,strapHeight]) RHOchunk3();
        }
        rotate(180,[0,0,1])
        union(){
            translate([0,0,strapHeight]) RHOchunk1();
            translate([0,0,strapHeight]) RHOchunk2();
            translate([0,0,strapHeight]) RHOchunk3();
        }
    }
}

// rhombus tile with strapwork attached
module RHOfullplain(){
    union(){
        color("orange") RHOtile();
        translate([0,0,tileHeight-embed])
            color("white") RHOstrap(strapThick-.5*clearance);
    }
}

// rhombus tile with striped strapwork attached
module RHOfullstripes(){
    union(){
        color("orange") RHOtile();
        translate([0,0,tileHeight-embed])
            color("white") RHOstripes();
    }
}

// rhombus tile with lines + offset clearance removed
module RHOcomplement(clear=.75*clearance){
    difference(){
        // pentagon tile
        linear_extrude(mosaicHeight)
            projection([0,0,1])
                RHOtile();
        // remove lines with clearance
        translate([0,0,-1]) 
            linear_extrude(mosaicHeight+2) 
            offset(delta=clear) 
            projection([0,0,1]) 
                RHOlines();
    }
}

////////////////////////////////////////////////////////
// definitions and modules for HEX tiles
// a certain squashed convex hexagon

// calculate hexagon radius given side length
HEXradius = s/2 + s*sin(54);

// this is the shorter "radius"
HEXshort = (s/2)*sin(72)/sin(54);

// list of hexagon vertex points
HEXpoints = [[HEXradius,0],[s/2,HEXshort],[-s/2,HEXshort],
             [-HEXradius,0],[-s/2,-HEXshort],[s/2,-HEXshort]];

// extruded plain hexagon tile
module HEXtile(){
    color("gold")
    linear_extrude(height=tileHeight)
    polygon(points=HEXpoints, paths=[[for (i=[0:5]) i]]);
}

// ugh, sucked to calculate these
// x and y lengths of interior points
xPoint = sin(36)*(s/2)*sin(72)/sin(54);
yPoint = HEXshort - sin(54)*(s/2)*sin(72)/sin(54);

// inside points for the hexagon strapwork
// used trig to calculate the interior point coordinates
HEXinside = [[xPoint,yPoint],[-1*xPoint,yPoint],
             [-1*xPoint,-1*yPoint],[xPoint,-1*yPoint]];

// list of hexagon midpoints
HEXmids = [for (i=[0:5]) move(HEXpoints[i%6],HEXpoints[(i+1)%6],.5)];

// paths of the hexagon strapwork
// alternates between vertex points and interior points
HEXpath = [HEXmids[0],
           HEXinside[0],
           HEXmids[1],
           HEXinside[1],
           HEXmids[2],
           HEXmids[3],
           HEXinside[2],
           HEXmids[4],
           HEXinside[3],
           HEXmids[5],
          ];

// 2D polygon whose boundary is the hexagon strapwork line
module HEXshape(){
    polygon(points=HEXpath, paths=[[for (i=[0:9]) i]]);
}
    
// extruded and thickened hexagon strapwork line 
module HEXstrap(strap=strapThick){
    // default is strapThick
    // but can specify others for clearance
    intersection(){
        linear_extrude(strapHeight)
            difference(){
                offset(delta=strap/2) HEXshape();
                offset(delta=-strap/2) HEXshape();
            }
        scale([1,1,strapHeight/tileHeight]) 
            HEXtile();
    }
}

// hexagon tile with enlarged strapwork etching
module HEXetch(){
    color("gold")
    difference(){
        HEXtile();
        translate([0,0,tileHeight-embed])
            HEXstrap(strapThick+clearance);
    }
}

// hexagon strapwork alone
module HEXlines(){
    color("white")
    HEXstrap(strapThick-.5*clearance);
}

// first piece of the hexagon stripes
// vertical on right with bottom cut off
module HEXchunk1(){
    intersection(){
        union(){
            strapCut(HEXmids[5],HEXmids[0],ridgeGap+ridgeThick);
            if (ridgeNumber==3) 
                strapCut(HEXmids[5],HEXmids[0],0);
            strapCut(HEXmids[5],HEXmids[0],-1*(ridgeGap+ridgeThick));
        }
        linear_extrude(strapHeight+ridgeHeight+1)
        polygon(points=[
                    go( HEXmids[5],
                        HEXmids[5]-normal(HEXpoints[5],HEXpoints[0]),
                        4.3*strapThick/5),
                    go(HEXmids[5],HEXpoints[0],3.1*strapThick/5),
                    HEXpoints[0],
                    HEXpoints[1]],
                paths=[[0,1,2,3,4]]);
    }
}

// second piece of the hexagon stripes
// from first midpoint to first inside, with cut
module HEXchunk2(){
    intersection(){
        union(){
            strapCut(HEXmids[0],HEXinside[0],ridgeGap+ridgeThick);
            if (ridgeNumber==3) 
                strapCut(HEXmids[0],HEXinside[0],0);
            strapCut(HEXmids[0],HEXinside[0],-1*(ridgeGap+ridgeThick));
        }
        linear_extrude(strapHeight+ridgeHeight+1)
        polygon(points=[
                    go( HEXmids[0],
                        HEXmids[0]-normal(HEXpoints[0],HEXpoints[1]),
                        4.3*strapThick/5),
                    go(HEXmids[0],HEXpoints[1],3.1*strapThick/5),
                    HEXpoints[1],
                    move(HEXinside[0],HEXpoints[1],-.25)],
                paths=[[0,1,2,3,4]]);
    }
}

// third piece of the hexagon stripes
// from first inside to top midpoint, no cut
module HEXchunk3(){
    intersection(){
        union(){
            strapCut(HEXmids[1],HEXinside[0],ridgeGap+ridgeThick);
            if (ridgeNumber==3) 
                strapCut(HEXmids[1],HEXinside[0],0);
            strapCut(HEXmids[1],HEXinside[0],-1*(ridgeGap+ridgeThick));
        }
        linear_extrude(strapHeight+ridgeHeight+1)
        polygon(points=[
                    HEXpoints[1],
                    HEXpoints[2],
                    move(HEXinside[0],HEXpoints[1],-.25)],
                paths=[[0,1,2,3,4]]);
    }
}

// fourth piece of the hexagon stripes
// from top midpoint to second inside, with cut
module HEXchunk4(){
    intersection(){
        union(){
            strapCut(HEXmids[1],HEXinside[1],ridgeGap+ridgeThick);
            if (ridgeNumber==3) 
                strapCut(HEXmids[1],HEXinside[1],0);
            strapCut(HEXmids[1],HEXinside[1],-1*(ridgeGap+ridgeThick));
        }
        linear_extrude(strapHeight+ridgeHeight+1)
        polygon(points=[
                    [0,0],
                    go( HEXmids[1],
                        HEXmids[1]-normal(HEXpoints[1],HEXpoints[2]),
                        4.3*strapThick/5),
                    go(HEXmids[1],HEXpoints[2],3.1*strapThick/5),
                    HEXpoints[2],
                    move(HEXinside[1],HEXpoints[2],-.25)],
                paths=[[0,1,2,3,4]]);
    }
}

// fifth piece of the hexagon stripes
// from second inside to third midpoint, no cut
module HEXchunk5(){
    intersection(){
        union(){
            strapCut(HEXmids[2],HEXinside[1],ridgeGap+ridgeThick);
            if (ridgeNumber==3) 
                strapCut(HEXmids[2],HEXinside[1],0);
            strapCut(HEXmids[2],HEXinside[1],-1*(ridgeGap+ridgeThick));
        }
        linear_extrude(strapHeight+ridgeHeight+1)
        polygon(points=[
                    move(HEXinside[1],HEXpoints[2],-.25),
                    HEXpoints[2],
                    HEXpoints[3]],
                paths=[[0,1,2,3,4]]);
    }
}

// all of the hexagon stripes
module HEXstripes(){
    color("white")
    union(){
        HEXlines();
        union(){
            translate([0,0,strapHeight]) HEXchunk1();
            translate([0,0,strapHeight]) HEXchunk2();
            translate([0,0,strapHeight]) HEXchunk3();
            translate([0,0,strapHeight]) HEXchunk4();
            translate([0,0,strapHeight]) HEXchunk5();
        }
        rotate(180,[0,0,1])
        union(){
            translate([0,0,strapHeight]) HEXchunk1();
            translate([0,0,strapHeight]) HEXchunk2();
            translate([0,0,strapHeight]) HEXchunk3();
            translate([0,0,strapHeight]) HEXchunk4();
            translate([0,0,strapHeight]) HEXchunk5();
        }
    }
}

// hexagon tile with plain strapwork attached
module HEXfullplain(){
    color("gold") HEXtile();
    translate([0,0,tileHeight-embed])
        color("white") HEXlines();
}

// hexagon tile with striped strapwork attached
module HEXfullstripes(){
    union(){
        color("gold") HEXtile();
        translate([0,0,tileHeight-embed])
            color("white") HEXstripes();
    }
}

// hexagon tile with lines + offset clearance removed
module HEXcomplement(clear=.75*clearance){
    difference(){
        // pentagon tile
        linear_extrude(mosaicHeight)
            projection([0,0,1])
                color("gold") HEXtile();
        // remove lines with clearance
        translate([0,0,-1]) 
            linear_extrude(mosaicHeight+2) 
            offset(delta=clear) 
            projection([0,0,1]) 
                color("white") HEXlines();
    }
}

////////////////////////////////////////////////////////
// vector traveling (tested only in 2D)

//distance from A to B
function dist(A,B) = 
    sqrt((B[0]-A[0])*(B[0]-A[0])+(B[1]-A[1])*(B[1]-A[1]));

// start at A and move to B
// stay in the AB segment as t goes from 0 to 1
function move(A,B,t) = A+t*(B-A);

// start at A and move in the direction of B for a distance d
function go(A,B,d) = 
    A+d*(B-A)/dist(A,B);

// 2D vector normal to line from A to B
function normal(A,B) = (1/dist(A,B))*[B[1]-A[1],A[0]-B[0]];
